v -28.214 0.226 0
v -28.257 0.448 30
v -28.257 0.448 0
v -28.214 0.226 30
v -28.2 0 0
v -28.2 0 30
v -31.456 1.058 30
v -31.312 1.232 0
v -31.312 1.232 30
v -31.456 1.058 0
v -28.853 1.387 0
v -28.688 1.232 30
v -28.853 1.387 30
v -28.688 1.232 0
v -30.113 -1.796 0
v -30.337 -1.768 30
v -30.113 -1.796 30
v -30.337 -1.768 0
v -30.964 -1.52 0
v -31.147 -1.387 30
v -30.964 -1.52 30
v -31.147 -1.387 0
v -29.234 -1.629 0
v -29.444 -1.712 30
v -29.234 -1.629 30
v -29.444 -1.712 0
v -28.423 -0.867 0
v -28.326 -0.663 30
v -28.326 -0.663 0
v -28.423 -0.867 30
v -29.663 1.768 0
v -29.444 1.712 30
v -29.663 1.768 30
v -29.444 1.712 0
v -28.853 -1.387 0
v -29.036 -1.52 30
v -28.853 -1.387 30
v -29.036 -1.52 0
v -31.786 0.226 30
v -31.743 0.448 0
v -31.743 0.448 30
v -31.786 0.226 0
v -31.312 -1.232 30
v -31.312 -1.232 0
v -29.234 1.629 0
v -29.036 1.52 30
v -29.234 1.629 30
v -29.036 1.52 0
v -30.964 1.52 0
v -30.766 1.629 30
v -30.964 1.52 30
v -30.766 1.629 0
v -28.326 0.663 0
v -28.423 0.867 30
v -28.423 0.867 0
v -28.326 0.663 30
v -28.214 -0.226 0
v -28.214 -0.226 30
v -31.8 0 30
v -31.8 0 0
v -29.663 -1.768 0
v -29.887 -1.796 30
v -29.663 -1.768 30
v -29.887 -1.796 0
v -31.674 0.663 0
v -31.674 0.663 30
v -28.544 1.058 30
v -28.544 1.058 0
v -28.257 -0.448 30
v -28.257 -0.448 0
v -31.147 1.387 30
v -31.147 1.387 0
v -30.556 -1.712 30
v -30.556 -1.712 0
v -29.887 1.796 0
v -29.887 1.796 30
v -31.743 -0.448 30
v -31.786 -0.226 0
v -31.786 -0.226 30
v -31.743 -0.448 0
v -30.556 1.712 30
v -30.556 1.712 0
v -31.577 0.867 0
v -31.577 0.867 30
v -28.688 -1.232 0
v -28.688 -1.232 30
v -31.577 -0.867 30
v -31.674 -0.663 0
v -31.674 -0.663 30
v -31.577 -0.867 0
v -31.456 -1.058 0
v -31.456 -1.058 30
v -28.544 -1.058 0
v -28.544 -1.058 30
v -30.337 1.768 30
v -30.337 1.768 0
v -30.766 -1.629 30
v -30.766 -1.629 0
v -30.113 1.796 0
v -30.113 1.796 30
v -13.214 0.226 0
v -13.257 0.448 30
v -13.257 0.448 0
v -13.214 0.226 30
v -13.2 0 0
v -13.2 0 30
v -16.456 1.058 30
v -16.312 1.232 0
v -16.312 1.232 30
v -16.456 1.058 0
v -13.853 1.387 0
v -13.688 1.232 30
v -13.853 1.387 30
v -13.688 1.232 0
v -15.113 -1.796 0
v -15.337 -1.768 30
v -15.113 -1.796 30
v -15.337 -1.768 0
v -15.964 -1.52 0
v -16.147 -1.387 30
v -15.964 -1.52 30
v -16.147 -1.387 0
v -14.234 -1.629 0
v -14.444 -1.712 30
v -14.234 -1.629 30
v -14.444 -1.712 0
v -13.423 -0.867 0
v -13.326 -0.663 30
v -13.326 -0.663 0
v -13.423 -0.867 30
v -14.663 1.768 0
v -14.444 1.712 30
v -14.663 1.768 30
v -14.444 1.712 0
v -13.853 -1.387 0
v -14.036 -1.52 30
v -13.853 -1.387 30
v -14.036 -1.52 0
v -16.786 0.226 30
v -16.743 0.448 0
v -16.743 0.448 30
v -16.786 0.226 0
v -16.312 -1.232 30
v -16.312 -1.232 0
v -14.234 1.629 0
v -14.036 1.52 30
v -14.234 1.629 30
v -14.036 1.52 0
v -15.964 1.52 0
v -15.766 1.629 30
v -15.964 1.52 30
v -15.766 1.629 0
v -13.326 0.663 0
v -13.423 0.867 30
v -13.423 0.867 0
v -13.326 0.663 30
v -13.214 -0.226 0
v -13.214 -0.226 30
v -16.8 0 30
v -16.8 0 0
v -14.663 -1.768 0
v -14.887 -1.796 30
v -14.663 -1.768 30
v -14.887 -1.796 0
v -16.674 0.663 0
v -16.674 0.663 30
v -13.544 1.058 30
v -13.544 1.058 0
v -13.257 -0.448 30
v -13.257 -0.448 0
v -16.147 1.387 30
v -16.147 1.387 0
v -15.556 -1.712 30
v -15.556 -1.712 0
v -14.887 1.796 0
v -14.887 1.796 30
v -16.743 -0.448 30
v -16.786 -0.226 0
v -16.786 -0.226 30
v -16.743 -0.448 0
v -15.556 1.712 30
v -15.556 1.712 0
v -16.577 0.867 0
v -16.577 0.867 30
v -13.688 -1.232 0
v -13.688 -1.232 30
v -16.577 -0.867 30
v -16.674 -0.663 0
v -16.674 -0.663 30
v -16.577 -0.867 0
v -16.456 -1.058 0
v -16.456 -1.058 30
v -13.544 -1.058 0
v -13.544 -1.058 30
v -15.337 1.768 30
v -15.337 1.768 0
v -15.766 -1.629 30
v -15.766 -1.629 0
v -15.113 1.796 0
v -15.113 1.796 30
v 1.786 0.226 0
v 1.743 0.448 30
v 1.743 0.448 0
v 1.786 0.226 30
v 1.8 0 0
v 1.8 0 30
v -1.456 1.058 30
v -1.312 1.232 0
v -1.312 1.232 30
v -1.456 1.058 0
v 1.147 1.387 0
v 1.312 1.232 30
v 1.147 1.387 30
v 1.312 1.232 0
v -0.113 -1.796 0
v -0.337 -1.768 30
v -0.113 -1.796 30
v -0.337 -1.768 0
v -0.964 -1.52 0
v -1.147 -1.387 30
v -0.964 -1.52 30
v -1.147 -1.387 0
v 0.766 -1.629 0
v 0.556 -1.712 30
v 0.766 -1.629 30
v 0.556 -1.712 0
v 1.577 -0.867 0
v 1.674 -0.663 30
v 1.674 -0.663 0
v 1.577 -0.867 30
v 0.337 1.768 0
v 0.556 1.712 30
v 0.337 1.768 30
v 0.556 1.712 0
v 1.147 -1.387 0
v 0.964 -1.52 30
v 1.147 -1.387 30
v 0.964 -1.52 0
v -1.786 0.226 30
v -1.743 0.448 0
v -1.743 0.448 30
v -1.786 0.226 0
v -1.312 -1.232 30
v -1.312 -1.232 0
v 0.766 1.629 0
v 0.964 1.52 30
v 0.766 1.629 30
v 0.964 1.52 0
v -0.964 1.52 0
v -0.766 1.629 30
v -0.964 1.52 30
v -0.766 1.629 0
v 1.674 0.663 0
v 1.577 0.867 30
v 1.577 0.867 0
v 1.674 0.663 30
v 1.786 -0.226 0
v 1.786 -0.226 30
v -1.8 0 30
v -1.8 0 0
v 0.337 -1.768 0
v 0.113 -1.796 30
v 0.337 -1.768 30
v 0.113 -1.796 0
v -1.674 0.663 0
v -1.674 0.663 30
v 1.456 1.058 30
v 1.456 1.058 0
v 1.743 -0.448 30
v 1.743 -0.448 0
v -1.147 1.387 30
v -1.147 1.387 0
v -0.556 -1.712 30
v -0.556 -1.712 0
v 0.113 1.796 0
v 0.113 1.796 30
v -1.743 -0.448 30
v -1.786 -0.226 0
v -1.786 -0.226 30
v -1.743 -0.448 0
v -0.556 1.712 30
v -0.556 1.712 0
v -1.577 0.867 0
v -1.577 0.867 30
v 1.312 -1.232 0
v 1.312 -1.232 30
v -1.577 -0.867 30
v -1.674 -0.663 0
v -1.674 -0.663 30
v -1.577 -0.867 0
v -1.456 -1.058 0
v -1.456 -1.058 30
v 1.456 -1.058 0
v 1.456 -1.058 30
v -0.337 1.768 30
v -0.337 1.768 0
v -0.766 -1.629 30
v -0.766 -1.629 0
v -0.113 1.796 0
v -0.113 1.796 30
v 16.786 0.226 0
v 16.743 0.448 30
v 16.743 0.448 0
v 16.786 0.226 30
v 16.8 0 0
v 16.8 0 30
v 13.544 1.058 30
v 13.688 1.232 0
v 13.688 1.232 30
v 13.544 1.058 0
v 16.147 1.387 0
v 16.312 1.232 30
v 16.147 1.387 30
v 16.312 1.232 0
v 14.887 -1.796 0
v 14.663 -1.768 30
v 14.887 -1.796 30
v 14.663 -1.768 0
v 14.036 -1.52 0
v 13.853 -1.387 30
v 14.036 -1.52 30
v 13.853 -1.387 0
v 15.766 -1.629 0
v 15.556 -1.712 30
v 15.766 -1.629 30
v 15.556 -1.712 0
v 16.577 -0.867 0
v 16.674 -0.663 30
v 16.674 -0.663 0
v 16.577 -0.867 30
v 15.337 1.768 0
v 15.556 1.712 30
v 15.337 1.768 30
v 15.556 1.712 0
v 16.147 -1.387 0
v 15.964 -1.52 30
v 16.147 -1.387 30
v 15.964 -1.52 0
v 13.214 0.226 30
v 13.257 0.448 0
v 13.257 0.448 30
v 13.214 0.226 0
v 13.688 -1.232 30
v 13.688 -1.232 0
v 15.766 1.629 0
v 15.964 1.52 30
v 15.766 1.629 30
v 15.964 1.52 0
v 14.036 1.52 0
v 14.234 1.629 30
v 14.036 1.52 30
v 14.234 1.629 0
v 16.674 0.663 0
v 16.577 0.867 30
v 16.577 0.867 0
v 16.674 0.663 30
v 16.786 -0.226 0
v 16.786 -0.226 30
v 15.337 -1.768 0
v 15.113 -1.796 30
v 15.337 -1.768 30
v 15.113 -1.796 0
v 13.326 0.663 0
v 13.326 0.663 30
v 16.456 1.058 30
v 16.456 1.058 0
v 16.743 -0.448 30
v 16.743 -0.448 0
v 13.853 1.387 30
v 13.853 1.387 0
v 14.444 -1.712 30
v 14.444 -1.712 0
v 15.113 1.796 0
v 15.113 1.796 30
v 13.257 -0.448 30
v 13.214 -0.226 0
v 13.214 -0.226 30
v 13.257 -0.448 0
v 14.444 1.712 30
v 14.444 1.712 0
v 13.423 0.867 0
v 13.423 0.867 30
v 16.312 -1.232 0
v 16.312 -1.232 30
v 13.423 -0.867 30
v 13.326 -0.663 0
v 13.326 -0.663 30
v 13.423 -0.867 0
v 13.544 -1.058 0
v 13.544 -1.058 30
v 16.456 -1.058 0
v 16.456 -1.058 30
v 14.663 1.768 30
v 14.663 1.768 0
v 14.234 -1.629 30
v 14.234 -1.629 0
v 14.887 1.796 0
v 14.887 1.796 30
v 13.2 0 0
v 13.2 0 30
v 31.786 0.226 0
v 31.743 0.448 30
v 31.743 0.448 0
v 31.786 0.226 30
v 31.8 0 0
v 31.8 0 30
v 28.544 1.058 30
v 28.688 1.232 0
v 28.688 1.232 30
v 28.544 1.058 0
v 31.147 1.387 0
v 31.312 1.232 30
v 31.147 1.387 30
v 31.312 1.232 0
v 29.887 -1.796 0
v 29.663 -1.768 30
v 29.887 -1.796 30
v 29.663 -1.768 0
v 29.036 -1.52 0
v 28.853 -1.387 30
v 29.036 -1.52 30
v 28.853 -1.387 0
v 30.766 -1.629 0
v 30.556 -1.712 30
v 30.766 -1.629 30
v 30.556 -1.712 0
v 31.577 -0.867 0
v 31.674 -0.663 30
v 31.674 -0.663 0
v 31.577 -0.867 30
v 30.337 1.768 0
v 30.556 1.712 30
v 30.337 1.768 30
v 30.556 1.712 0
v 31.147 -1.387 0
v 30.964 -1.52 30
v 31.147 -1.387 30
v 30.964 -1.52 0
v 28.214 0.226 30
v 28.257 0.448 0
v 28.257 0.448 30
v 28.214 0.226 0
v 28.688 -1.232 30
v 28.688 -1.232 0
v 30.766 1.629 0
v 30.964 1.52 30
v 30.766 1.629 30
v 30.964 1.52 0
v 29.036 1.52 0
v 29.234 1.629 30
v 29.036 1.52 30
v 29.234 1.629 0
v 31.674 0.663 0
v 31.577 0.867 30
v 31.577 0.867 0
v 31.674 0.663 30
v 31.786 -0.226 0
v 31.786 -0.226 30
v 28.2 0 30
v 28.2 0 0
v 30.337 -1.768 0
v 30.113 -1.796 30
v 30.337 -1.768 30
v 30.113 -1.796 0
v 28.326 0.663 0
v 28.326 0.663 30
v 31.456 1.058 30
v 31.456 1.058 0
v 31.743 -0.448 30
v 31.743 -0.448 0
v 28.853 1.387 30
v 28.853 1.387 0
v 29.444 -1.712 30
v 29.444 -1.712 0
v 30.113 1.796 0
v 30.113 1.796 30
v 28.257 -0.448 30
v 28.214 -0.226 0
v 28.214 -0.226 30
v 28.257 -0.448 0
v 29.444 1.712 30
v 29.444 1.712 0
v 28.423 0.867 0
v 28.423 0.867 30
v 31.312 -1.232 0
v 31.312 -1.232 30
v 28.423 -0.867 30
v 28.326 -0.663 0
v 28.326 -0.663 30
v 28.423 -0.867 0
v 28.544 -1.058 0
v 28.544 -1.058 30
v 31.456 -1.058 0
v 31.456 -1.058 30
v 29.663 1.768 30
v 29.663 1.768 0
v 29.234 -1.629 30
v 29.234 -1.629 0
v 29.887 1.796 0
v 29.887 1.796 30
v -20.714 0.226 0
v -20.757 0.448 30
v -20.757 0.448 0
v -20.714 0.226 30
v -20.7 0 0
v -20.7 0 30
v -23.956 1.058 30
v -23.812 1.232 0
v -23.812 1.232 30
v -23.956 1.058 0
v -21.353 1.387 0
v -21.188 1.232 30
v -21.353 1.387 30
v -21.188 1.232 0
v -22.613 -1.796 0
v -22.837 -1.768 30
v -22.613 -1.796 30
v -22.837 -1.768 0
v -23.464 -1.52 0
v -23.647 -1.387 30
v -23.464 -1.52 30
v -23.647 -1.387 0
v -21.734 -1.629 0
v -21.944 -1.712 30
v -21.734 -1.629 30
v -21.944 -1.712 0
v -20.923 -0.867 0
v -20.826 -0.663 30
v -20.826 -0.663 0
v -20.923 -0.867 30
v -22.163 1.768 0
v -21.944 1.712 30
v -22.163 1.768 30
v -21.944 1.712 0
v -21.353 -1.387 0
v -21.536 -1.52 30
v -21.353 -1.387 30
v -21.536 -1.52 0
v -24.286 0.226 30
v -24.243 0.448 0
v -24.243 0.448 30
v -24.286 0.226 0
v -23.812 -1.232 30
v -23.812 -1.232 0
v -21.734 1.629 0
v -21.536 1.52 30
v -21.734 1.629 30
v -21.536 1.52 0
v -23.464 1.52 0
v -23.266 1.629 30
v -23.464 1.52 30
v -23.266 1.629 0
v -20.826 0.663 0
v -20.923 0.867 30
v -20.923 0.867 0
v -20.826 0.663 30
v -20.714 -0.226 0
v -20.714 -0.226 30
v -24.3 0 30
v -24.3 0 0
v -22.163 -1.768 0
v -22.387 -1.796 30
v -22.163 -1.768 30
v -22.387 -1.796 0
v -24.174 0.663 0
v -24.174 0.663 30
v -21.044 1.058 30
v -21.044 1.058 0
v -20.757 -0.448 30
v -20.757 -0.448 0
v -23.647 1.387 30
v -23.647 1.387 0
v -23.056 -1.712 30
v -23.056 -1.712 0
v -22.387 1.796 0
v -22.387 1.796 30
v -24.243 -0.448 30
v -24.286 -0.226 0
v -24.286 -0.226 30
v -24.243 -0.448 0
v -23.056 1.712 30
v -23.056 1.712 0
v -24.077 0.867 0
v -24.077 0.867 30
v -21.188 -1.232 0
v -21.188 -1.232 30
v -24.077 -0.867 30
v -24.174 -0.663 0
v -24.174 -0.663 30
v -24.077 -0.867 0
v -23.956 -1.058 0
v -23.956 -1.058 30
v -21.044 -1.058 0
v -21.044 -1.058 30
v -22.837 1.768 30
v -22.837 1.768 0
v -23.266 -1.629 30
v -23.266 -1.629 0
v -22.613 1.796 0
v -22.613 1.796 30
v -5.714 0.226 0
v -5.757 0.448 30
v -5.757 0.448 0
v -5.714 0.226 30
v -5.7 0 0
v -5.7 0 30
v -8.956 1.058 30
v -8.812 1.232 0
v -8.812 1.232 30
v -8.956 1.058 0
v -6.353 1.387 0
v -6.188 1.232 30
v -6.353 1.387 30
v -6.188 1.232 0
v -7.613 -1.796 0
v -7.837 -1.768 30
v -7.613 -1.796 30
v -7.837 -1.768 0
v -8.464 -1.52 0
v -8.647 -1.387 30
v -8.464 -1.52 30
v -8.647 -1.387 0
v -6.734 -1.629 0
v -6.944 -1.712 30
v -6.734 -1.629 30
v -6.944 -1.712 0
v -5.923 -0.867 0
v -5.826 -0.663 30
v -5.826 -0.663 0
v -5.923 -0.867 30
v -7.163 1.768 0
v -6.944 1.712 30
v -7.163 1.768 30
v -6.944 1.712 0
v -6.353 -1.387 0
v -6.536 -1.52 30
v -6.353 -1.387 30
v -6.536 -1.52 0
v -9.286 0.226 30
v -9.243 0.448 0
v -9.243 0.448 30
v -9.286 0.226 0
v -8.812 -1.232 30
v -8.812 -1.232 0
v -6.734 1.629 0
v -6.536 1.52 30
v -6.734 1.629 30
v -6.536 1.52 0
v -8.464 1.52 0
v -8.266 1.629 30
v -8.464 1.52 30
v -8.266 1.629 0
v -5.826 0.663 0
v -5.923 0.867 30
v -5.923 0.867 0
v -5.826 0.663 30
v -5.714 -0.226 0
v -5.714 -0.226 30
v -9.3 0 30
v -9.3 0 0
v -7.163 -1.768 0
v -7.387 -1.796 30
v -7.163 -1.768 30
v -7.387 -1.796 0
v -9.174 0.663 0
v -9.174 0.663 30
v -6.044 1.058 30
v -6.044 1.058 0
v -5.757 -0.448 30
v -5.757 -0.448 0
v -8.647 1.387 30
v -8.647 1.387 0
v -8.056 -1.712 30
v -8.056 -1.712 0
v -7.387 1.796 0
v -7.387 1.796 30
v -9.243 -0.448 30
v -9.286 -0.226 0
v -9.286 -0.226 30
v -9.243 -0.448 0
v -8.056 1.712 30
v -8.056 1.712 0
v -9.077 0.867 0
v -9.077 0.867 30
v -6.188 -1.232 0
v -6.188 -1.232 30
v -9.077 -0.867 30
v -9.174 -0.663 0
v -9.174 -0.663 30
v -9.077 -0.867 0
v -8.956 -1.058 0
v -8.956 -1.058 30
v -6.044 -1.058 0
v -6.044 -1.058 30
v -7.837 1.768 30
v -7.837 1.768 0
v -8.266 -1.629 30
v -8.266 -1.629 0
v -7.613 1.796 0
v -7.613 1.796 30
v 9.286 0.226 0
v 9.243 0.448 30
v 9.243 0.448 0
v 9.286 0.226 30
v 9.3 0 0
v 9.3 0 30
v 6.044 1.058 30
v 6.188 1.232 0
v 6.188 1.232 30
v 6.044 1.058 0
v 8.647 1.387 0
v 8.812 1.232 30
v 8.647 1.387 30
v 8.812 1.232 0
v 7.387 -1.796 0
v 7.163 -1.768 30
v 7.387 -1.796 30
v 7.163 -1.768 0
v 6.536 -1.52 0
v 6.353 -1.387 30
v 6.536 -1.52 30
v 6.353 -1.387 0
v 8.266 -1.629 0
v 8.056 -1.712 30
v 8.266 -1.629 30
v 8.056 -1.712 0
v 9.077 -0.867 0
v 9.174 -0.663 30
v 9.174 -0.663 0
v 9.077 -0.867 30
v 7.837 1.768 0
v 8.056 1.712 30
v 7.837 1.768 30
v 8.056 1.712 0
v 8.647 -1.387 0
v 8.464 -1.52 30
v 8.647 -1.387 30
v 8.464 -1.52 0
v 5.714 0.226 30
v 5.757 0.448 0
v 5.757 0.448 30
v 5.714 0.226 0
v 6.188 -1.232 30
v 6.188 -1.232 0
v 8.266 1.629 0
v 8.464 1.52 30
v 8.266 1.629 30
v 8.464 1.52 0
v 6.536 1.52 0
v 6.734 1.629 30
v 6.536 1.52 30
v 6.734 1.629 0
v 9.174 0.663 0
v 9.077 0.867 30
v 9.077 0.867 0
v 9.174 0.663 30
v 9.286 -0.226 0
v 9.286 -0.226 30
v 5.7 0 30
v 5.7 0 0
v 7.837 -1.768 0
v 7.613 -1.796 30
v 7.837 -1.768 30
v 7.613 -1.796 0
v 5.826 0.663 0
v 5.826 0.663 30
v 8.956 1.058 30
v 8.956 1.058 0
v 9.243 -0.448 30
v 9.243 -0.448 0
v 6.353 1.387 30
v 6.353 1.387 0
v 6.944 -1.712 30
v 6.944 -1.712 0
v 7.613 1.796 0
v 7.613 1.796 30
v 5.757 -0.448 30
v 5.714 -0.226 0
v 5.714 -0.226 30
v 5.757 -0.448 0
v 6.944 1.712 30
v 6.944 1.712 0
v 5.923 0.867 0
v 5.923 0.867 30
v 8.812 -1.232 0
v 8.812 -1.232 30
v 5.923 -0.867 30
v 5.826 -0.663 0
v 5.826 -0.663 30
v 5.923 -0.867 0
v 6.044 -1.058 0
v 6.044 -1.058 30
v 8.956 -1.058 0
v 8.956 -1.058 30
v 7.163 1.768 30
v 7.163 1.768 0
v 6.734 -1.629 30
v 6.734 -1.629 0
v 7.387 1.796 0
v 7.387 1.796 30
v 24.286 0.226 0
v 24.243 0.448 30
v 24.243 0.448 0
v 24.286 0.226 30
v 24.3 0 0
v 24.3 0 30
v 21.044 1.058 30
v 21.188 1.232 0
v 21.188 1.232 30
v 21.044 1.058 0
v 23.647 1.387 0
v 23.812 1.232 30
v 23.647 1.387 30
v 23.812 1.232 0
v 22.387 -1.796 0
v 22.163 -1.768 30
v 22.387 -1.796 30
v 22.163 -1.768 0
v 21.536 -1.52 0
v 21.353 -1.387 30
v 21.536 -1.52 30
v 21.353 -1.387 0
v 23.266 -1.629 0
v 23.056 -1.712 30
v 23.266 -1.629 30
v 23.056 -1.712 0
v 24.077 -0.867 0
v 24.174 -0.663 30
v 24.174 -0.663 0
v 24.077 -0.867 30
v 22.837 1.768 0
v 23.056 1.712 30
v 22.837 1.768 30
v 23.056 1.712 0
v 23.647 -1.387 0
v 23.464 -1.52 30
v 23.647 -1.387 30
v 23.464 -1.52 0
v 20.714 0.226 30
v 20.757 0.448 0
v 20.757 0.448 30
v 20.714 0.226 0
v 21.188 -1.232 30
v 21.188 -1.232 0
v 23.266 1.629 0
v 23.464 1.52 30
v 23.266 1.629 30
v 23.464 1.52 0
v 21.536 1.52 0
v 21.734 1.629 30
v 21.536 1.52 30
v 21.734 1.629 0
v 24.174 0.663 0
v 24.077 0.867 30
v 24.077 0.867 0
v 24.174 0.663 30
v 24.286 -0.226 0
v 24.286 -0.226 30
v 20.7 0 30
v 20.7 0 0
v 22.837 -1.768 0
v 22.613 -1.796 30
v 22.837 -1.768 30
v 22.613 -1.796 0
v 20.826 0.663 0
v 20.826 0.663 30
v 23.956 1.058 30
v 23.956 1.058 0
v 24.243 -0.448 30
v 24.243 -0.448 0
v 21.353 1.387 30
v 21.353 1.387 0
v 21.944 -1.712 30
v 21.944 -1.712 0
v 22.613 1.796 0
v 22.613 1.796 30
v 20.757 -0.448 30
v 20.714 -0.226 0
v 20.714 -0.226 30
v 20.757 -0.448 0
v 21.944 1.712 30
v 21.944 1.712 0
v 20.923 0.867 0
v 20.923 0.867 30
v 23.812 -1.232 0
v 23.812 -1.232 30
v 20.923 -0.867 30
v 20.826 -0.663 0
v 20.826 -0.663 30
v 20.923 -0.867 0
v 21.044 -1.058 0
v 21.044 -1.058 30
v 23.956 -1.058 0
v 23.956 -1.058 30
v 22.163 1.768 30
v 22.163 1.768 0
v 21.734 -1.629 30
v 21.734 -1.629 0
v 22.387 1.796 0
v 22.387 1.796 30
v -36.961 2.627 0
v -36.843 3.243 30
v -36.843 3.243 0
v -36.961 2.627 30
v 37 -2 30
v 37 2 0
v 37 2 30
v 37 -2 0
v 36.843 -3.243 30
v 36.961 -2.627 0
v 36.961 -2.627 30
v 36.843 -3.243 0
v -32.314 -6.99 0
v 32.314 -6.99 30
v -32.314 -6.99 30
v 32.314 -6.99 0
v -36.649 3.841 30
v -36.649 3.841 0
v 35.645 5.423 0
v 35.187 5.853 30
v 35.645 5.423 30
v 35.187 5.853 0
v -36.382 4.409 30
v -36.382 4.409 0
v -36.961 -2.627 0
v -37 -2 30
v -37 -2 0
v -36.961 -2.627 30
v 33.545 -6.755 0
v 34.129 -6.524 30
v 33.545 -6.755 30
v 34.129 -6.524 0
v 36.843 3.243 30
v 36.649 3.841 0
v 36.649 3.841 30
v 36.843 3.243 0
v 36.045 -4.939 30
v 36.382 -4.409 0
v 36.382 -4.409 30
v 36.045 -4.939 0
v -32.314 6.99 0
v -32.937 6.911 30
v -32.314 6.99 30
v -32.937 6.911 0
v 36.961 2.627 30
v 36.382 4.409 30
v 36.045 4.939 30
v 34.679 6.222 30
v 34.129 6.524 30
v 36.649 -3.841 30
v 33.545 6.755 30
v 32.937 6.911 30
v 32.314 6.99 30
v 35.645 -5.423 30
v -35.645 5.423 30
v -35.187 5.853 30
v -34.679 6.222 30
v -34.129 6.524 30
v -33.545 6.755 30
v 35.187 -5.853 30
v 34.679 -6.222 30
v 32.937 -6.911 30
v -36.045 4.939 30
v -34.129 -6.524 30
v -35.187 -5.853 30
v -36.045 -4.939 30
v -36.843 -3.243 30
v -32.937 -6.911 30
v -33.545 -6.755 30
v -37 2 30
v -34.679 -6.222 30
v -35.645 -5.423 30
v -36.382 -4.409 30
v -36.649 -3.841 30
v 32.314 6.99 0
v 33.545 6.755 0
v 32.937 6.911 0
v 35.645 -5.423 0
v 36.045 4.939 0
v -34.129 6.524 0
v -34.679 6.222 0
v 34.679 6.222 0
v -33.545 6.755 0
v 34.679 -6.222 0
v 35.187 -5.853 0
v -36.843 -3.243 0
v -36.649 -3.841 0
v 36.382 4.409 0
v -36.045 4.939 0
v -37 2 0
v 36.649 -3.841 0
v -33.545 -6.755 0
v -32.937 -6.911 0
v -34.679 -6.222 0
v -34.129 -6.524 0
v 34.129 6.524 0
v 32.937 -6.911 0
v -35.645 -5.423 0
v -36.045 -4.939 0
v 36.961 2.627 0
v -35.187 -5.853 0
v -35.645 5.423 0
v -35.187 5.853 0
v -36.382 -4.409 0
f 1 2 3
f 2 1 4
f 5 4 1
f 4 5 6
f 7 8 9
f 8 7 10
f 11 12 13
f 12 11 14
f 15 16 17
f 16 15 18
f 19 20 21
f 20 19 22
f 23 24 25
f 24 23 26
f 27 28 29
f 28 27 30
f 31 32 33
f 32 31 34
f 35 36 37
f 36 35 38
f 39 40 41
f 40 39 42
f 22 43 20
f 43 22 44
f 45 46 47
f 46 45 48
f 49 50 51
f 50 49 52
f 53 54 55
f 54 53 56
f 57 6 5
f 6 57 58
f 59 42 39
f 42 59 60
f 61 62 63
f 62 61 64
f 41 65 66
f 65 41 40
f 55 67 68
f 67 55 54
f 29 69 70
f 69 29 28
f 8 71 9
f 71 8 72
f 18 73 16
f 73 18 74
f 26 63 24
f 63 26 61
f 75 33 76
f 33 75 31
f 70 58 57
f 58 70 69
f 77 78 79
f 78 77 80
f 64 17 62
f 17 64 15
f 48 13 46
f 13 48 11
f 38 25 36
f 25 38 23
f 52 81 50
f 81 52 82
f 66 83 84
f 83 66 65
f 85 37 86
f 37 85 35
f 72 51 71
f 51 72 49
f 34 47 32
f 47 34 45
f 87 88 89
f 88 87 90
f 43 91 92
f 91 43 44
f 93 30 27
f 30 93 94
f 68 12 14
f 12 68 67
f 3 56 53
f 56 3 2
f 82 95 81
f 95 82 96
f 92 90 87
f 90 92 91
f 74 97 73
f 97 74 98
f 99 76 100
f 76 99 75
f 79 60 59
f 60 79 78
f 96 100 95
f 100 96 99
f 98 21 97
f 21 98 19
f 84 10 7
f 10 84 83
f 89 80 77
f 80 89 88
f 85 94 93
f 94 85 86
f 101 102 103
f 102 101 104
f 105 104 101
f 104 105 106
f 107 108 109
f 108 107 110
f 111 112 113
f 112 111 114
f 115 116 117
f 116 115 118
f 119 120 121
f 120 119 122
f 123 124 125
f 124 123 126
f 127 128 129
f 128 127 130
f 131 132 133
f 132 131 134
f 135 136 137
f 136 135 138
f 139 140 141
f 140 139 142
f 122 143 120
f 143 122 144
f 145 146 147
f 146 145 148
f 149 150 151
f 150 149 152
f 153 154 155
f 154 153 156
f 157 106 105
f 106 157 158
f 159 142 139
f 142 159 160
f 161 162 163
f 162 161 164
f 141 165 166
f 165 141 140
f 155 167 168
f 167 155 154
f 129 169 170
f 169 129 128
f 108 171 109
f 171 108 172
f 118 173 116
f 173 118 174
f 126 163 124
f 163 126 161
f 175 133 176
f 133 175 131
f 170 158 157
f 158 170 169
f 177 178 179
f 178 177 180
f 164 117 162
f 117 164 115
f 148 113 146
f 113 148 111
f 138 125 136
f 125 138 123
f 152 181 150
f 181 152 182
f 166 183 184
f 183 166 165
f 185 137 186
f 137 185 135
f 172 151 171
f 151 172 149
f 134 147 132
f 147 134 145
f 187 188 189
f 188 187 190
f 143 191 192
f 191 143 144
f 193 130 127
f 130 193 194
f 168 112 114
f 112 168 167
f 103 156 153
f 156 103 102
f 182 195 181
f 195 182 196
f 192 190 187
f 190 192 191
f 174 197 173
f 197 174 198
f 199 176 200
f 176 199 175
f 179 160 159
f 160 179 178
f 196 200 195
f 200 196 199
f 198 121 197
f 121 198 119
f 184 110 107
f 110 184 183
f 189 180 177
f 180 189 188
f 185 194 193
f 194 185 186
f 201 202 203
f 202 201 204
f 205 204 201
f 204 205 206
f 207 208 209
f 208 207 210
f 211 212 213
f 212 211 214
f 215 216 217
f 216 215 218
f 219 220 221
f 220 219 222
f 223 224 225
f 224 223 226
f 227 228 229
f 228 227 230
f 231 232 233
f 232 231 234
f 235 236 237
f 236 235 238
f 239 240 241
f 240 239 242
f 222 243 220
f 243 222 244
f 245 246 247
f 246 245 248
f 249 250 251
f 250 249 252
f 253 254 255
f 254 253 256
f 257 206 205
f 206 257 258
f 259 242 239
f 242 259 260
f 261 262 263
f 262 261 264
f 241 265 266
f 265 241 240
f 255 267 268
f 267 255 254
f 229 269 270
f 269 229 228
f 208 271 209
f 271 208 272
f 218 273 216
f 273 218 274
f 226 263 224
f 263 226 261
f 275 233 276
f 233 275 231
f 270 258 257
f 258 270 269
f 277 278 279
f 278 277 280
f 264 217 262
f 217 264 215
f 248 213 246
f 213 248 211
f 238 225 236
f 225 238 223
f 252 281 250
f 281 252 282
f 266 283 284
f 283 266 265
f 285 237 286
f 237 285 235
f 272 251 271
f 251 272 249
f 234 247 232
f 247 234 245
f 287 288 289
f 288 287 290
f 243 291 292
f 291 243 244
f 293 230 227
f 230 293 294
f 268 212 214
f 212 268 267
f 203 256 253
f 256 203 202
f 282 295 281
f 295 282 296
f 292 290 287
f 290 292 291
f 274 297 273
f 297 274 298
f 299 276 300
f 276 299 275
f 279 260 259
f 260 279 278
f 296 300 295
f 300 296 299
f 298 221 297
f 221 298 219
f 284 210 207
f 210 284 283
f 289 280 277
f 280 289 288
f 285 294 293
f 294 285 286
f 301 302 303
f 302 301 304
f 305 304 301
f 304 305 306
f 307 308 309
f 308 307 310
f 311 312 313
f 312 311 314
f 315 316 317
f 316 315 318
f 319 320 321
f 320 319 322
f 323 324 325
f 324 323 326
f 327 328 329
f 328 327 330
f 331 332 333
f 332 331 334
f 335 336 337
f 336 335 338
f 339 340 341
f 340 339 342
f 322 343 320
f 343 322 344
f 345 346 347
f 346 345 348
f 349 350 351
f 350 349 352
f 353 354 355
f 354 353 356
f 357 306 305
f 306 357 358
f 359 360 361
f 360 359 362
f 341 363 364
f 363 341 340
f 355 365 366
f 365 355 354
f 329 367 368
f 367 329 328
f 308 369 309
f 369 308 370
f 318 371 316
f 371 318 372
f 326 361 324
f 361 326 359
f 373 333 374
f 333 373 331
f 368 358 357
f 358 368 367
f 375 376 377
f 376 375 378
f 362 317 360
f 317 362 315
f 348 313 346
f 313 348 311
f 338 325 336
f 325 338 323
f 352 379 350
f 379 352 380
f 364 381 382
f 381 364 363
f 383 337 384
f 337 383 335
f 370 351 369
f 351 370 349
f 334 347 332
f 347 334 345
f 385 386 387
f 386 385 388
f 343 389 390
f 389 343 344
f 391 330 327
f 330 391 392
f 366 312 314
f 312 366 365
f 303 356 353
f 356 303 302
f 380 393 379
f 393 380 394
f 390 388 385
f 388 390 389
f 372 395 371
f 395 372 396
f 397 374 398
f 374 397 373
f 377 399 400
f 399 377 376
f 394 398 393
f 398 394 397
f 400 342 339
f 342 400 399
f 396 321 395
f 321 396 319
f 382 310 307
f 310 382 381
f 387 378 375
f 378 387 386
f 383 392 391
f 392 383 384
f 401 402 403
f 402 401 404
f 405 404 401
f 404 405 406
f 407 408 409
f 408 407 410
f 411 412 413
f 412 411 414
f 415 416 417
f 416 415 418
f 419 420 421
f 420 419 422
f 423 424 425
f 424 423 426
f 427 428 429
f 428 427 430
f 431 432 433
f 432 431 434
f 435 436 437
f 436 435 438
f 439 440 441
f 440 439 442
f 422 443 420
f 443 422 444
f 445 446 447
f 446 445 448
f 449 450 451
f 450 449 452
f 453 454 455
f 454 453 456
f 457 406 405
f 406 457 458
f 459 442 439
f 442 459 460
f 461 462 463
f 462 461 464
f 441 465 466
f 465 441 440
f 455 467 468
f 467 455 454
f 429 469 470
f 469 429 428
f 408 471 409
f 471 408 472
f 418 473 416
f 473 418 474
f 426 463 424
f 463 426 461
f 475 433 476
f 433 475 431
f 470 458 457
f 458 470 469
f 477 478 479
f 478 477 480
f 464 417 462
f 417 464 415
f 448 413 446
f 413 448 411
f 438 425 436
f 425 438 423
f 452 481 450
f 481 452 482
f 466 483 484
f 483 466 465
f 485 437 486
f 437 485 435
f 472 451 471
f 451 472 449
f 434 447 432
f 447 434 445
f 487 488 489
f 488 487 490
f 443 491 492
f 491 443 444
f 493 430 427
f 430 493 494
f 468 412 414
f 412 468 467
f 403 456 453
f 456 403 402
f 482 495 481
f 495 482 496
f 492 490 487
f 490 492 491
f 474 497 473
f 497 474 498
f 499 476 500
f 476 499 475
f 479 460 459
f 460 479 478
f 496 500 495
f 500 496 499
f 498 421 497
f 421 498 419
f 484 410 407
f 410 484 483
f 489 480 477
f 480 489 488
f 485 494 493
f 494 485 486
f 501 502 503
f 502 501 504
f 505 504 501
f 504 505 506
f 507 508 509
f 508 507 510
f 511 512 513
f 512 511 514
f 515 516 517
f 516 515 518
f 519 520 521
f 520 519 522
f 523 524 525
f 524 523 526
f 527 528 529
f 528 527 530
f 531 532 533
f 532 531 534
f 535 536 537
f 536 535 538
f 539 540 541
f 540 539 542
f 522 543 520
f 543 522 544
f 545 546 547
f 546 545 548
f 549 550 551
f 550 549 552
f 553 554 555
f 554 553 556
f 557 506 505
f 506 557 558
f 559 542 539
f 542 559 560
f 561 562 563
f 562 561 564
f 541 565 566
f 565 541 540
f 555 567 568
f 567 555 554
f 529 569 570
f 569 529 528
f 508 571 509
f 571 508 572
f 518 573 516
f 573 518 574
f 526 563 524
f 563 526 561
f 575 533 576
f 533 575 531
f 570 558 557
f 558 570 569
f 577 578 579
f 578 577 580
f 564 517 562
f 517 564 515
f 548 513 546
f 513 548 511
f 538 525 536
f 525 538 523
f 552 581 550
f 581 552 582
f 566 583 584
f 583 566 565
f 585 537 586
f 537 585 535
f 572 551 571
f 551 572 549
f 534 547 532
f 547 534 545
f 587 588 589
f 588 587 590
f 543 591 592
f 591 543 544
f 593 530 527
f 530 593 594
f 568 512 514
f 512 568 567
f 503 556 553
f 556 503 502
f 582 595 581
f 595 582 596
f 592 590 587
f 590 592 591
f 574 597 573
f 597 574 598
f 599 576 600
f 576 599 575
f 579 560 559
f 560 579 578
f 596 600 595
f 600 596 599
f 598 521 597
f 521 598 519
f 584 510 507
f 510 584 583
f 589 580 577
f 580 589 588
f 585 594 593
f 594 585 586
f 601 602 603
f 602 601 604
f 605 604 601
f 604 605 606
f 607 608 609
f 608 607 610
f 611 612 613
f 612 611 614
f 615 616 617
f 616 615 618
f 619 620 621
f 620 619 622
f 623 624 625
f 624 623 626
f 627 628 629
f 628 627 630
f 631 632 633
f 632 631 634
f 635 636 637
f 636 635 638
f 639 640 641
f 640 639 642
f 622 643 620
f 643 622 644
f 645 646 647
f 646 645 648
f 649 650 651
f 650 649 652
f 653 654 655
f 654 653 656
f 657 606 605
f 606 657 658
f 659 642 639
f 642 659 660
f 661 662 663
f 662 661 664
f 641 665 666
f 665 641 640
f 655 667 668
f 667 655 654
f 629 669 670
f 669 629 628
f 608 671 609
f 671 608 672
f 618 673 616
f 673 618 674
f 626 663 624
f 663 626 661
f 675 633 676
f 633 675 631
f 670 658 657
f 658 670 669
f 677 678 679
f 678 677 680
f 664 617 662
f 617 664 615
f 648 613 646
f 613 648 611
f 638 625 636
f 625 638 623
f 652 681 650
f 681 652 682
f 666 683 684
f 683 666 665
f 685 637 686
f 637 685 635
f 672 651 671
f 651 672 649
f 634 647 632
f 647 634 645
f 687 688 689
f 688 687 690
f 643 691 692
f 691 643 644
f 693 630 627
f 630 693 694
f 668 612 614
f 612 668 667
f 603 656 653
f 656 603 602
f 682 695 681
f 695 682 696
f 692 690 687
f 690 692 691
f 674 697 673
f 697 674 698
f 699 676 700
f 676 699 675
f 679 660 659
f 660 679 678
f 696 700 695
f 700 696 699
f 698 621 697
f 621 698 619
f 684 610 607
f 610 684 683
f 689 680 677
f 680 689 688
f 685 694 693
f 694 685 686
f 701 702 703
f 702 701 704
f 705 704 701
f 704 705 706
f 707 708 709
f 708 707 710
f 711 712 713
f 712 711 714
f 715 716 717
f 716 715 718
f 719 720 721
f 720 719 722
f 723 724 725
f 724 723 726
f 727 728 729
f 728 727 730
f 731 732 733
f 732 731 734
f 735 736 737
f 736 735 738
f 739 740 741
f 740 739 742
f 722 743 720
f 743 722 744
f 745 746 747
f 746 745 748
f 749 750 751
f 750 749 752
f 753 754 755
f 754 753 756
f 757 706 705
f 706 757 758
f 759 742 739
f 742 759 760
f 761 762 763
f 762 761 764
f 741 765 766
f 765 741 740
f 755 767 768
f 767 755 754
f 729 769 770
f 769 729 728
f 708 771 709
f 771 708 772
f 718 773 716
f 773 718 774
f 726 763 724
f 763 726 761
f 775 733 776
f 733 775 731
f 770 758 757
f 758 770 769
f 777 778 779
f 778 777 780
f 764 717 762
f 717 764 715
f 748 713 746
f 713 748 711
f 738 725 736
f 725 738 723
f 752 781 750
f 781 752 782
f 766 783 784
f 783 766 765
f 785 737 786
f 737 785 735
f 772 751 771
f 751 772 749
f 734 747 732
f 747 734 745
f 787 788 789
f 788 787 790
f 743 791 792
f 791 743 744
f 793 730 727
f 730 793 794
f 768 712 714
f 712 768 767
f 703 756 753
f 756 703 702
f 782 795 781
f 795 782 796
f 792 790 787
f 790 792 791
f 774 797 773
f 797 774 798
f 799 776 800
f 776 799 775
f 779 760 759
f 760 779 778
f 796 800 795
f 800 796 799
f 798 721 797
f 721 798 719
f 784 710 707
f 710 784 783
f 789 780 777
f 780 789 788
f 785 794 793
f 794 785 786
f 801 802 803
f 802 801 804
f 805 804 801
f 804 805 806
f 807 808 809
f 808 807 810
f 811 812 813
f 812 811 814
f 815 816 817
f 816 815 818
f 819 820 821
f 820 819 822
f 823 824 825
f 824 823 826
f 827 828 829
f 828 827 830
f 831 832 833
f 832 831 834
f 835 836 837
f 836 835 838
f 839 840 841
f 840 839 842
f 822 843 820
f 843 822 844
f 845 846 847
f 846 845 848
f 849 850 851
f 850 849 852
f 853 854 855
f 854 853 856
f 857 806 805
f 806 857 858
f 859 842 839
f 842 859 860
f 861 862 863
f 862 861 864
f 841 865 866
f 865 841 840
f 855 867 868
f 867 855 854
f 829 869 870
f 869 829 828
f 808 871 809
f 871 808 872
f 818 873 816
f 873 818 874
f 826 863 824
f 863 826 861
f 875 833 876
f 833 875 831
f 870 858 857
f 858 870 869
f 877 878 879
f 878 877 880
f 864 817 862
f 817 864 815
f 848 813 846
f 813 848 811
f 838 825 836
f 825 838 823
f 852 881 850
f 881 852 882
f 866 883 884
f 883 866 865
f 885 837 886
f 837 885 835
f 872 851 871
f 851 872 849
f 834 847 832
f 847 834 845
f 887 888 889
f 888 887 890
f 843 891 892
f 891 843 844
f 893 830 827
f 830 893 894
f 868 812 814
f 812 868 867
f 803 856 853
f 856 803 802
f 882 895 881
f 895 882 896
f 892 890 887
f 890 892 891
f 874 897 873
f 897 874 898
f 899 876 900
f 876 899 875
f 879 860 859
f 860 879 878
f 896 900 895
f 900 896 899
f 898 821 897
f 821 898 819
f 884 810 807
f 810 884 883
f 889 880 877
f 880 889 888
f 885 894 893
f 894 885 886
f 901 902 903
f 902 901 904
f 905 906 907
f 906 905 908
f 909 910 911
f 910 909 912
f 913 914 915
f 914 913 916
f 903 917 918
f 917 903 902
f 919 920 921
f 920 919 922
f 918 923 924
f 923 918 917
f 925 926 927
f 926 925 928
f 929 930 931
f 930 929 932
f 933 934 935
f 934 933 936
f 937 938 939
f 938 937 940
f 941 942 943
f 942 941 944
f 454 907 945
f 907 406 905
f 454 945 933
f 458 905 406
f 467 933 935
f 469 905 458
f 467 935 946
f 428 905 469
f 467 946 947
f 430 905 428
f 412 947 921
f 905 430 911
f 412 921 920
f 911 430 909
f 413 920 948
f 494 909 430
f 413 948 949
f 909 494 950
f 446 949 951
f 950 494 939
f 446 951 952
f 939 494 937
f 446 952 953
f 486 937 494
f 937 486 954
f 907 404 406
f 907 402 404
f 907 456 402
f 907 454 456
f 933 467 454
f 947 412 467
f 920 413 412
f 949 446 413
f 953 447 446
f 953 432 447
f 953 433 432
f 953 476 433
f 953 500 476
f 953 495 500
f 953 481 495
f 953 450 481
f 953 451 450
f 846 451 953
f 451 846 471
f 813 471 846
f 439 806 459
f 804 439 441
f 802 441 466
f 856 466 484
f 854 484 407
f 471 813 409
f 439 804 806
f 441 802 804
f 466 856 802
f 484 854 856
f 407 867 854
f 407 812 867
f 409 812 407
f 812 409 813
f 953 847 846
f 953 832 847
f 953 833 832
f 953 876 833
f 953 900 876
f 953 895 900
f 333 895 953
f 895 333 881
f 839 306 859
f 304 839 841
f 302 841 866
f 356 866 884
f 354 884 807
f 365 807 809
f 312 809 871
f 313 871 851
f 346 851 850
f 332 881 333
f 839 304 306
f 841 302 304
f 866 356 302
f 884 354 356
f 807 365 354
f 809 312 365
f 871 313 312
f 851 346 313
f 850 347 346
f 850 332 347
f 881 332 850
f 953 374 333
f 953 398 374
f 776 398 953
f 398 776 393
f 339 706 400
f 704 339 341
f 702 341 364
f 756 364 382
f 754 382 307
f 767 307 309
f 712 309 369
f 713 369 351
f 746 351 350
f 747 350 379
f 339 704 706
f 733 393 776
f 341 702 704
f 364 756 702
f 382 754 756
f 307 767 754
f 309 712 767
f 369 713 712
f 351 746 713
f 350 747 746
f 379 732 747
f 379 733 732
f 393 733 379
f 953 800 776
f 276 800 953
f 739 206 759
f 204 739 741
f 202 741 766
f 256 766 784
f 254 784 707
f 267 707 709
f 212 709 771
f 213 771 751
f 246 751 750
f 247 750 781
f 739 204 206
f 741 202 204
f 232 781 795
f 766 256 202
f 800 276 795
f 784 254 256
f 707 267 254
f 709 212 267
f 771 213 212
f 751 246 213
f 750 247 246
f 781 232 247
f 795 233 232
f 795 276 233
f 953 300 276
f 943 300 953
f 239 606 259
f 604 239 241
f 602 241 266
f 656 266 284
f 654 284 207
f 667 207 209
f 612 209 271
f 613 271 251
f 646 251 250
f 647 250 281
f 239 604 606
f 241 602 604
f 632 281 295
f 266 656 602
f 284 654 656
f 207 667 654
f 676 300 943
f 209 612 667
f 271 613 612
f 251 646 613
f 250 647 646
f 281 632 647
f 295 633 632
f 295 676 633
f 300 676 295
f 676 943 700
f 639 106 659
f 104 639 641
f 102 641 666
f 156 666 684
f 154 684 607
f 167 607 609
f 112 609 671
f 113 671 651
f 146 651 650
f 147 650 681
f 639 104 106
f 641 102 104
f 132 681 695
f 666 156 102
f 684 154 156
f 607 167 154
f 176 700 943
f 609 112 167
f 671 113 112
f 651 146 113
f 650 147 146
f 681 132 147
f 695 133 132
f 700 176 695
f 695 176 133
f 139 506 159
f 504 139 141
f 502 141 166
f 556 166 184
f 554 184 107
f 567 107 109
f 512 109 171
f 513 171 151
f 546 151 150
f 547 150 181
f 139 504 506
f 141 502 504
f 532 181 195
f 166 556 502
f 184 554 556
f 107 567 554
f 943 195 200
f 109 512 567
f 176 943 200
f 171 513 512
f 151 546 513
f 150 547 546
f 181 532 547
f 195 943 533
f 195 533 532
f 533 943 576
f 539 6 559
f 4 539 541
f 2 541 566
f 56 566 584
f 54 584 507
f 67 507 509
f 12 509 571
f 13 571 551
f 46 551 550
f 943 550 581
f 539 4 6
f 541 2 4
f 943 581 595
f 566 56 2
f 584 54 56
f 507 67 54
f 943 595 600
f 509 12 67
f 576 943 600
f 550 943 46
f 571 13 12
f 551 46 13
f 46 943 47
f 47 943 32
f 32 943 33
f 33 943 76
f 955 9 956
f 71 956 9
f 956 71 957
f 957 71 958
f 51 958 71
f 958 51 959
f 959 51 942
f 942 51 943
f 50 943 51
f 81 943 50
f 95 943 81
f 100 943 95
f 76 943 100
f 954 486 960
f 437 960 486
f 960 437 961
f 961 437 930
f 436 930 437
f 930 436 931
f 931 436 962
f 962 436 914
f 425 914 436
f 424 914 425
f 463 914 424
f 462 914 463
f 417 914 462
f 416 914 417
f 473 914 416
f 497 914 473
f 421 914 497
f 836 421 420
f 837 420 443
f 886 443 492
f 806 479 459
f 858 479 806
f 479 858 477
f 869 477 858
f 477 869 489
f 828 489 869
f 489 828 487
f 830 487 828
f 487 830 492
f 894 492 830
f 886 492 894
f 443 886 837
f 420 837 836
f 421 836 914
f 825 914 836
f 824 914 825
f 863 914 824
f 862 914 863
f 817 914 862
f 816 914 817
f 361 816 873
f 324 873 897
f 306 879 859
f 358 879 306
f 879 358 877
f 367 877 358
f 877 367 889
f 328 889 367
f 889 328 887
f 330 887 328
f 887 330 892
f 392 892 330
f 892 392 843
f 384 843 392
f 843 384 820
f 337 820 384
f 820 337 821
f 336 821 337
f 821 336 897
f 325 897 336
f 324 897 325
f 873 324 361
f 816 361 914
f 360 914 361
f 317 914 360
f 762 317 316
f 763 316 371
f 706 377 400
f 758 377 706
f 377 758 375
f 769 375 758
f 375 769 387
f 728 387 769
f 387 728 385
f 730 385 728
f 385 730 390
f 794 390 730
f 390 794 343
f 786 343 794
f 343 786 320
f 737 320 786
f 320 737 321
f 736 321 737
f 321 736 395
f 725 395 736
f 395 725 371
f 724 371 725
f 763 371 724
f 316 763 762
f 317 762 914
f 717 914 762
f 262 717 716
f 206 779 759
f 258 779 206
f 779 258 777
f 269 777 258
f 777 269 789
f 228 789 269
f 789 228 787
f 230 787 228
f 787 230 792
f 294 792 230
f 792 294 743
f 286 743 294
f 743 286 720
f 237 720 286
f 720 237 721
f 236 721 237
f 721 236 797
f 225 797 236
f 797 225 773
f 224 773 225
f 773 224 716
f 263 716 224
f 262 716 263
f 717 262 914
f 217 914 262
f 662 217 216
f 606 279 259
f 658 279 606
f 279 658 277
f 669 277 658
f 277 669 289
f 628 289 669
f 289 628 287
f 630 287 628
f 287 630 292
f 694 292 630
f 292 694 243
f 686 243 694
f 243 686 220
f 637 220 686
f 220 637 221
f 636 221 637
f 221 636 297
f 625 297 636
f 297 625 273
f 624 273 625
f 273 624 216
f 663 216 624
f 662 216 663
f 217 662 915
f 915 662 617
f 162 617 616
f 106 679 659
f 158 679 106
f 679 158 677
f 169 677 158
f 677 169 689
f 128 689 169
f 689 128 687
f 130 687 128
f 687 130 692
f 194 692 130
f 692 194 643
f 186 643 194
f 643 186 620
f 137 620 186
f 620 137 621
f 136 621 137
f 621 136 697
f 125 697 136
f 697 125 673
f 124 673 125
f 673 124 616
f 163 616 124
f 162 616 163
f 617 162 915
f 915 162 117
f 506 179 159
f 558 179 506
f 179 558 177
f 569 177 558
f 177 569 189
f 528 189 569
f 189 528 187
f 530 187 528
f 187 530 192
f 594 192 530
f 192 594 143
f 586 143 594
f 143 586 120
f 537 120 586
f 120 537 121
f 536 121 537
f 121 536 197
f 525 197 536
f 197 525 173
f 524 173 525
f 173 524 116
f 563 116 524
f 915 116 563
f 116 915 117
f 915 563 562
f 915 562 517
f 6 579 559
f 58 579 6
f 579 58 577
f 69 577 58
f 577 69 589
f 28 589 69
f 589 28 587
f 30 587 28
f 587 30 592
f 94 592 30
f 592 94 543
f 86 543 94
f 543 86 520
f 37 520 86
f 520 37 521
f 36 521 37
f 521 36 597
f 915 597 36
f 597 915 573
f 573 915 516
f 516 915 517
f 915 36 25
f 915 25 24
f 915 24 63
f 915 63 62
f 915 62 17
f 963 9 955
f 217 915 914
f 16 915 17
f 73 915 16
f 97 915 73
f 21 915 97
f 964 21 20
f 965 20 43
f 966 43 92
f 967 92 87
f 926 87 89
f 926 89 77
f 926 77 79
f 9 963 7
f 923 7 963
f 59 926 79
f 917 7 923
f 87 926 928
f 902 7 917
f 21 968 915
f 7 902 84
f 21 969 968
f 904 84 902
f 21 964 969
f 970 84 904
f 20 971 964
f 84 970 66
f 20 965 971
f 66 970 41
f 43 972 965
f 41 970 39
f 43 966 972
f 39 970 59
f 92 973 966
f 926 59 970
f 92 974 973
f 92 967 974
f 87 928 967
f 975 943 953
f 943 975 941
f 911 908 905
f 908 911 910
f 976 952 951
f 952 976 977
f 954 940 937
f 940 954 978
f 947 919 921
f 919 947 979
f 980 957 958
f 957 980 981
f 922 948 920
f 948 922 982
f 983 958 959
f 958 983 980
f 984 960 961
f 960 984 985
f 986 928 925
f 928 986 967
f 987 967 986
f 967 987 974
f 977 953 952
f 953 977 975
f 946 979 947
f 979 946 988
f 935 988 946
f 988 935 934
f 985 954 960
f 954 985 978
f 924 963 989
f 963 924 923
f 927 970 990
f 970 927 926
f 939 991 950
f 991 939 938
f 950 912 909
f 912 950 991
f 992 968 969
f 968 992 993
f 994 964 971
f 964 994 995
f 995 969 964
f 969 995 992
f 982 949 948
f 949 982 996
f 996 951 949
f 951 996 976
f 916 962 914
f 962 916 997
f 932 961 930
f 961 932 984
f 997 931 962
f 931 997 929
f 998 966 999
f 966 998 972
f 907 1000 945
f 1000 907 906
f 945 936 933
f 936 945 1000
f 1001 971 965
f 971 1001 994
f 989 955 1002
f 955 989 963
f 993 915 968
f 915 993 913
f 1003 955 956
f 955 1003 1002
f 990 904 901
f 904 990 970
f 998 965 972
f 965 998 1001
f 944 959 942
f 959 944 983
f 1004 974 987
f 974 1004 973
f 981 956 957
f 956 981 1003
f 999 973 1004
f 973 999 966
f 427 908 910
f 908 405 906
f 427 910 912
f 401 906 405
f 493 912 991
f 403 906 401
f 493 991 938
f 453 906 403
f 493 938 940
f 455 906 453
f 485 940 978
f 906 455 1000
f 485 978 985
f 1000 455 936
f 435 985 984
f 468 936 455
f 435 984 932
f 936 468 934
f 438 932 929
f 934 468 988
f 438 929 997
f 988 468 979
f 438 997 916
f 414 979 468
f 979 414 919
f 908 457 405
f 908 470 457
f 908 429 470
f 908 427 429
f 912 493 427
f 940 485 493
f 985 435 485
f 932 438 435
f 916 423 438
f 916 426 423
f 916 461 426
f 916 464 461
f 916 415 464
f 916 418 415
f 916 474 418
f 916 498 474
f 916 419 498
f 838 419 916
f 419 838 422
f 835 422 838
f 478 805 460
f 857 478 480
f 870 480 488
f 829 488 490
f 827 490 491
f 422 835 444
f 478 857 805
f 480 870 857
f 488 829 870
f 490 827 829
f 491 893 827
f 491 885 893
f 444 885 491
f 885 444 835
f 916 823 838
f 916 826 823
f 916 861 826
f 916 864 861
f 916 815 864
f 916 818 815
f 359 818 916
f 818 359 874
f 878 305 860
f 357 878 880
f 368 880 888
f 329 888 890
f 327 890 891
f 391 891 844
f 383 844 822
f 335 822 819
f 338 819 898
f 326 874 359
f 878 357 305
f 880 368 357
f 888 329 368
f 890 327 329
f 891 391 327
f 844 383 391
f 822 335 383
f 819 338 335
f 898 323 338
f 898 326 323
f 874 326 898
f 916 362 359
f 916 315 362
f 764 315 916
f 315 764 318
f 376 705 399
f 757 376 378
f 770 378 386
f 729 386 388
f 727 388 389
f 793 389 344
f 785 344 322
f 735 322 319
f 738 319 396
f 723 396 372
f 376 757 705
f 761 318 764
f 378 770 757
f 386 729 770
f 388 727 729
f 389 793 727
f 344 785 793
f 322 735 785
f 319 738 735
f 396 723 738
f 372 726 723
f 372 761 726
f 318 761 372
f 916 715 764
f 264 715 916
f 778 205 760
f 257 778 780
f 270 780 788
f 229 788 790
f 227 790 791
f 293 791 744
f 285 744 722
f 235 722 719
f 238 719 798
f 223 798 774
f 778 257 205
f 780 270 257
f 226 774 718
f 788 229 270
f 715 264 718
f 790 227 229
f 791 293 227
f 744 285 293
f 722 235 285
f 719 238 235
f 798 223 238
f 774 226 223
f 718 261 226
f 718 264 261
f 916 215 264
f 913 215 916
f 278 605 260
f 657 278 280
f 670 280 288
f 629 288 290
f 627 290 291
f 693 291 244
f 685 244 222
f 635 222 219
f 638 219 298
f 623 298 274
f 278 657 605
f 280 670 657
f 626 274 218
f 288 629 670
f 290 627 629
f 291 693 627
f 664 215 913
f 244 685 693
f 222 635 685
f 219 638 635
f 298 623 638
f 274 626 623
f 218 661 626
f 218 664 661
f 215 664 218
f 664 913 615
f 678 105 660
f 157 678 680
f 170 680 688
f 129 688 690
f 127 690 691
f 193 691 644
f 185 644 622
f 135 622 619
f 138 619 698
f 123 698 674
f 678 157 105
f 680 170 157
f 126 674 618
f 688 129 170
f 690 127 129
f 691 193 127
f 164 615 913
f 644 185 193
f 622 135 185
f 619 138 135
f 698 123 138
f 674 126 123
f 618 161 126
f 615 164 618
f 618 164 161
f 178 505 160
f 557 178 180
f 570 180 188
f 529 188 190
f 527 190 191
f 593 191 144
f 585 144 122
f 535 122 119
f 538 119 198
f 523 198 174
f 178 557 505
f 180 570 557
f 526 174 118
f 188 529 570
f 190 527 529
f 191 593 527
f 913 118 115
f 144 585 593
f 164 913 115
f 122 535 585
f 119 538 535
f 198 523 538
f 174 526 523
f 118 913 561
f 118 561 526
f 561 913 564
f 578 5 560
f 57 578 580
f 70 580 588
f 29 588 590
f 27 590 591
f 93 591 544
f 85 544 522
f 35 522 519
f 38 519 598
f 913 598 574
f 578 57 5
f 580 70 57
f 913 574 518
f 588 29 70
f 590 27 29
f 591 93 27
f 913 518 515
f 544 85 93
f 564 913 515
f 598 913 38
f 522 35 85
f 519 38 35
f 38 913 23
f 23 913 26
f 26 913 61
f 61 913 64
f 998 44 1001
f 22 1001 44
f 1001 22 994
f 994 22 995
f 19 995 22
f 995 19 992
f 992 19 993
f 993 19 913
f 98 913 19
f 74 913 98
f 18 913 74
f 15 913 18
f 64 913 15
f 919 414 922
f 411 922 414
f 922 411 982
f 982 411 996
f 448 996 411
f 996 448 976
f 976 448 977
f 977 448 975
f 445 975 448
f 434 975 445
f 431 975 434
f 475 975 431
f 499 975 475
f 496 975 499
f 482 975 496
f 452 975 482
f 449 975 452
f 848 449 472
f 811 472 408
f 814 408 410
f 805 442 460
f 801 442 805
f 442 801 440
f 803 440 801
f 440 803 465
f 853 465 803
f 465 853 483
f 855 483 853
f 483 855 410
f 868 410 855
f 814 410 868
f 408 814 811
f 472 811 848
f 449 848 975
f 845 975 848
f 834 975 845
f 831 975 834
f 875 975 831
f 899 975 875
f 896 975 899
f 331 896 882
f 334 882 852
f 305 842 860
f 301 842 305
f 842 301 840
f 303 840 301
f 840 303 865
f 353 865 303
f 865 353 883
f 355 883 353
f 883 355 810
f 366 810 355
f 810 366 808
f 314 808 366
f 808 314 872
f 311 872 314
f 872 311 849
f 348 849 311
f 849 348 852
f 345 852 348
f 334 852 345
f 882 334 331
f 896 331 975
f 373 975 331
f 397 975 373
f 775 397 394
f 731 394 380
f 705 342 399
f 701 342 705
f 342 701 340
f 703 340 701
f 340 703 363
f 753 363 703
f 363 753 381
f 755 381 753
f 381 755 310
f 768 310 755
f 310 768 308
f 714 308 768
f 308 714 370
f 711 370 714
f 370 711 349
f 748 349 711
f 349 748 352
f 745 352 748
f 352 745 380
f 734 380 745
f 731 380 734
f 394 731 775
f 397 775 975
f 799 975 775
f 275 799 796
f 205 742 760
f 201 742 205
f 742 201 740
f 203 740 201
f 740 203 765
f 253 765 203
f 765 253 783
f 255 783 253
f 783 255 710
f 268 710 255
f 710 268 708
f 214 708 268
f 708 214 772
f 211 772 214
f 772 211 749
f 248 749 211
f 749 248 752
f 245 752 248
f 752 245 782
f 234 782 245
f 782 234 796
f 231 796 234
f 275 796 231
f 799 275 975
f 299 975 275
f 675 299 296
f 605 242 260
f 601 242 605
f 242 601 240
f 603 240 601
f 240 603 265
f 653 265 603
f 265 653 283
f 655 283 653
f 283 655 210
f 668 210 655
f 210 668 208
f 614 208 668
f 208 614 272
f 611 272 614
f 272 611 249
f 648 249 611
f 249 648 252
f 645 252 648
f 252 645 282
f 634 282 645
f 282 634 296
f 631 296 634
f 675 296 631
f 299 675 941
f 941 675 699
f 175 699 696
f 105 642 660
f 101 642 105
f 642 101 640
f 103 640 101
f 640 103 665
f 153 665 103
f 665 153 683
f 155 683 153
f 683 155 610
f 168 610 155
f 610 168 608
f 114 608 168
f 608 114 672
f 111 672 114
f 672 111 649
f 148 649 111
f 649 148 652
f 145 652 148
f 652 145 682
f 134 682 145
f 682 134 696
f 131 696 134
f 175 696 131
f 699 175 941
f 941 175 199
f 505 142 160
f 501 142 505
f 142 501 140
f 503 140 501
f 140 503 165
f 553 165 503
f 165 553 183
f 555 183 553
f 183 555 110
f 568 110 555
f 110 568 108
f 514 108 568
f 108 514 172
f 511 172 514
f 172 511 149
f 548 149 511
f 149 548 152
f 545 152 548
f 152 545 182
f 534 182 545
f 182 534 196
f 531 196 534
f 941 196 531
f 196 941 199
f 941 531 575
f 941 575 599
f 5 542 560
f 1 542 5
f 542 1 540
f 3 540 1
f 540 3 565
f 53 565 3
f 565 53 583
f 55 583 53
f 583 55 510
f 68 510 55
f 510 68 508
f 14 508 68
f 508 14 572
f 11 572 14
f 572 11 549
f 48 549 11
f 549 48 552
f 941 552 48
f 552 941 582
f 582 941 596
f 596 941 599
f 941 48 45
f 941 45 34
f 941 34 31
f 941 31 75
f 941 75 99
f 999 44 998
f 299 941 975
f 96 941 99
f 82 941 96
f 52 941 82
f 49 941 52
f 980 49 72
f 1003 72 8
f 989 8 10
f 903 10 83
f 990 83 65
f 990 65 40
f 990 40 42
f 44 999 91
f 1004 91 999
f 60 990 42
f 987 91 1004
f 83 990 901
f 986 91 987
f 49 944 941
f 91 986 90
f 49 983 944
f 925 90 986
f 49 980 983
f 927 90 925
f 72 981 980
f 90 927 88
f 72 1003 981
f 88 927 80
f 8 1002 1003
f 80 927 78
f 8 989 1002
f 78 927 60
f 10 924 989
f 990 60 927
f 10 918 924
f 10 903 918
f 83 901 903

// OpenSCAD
$fn = 50;


difference() {
	union() {
		hull() {
			translate(v = [-32.0000000000, 2.0000000000, 0]) {
				cylinder(h = 30, r = 5);
			}
			translate(v = [32.0000000000, 2.0000000000, 0]) {
				cylinder(h = 30, r = 5);
			}
			translate(v = [-32.0000000000, -2.0000000000, 0]) {
				cylinder(h = 30, r = 5);
			}
			translate(v = [32.0000000000, -2.0000000000, 0]) {
				cylinder(h = 30, r = 5);
			}
		}
	}
	union() {
		translate(v = [-30.0000000000, 0.0000000000, 0]) {
			translate(v = [0, 0, -100]) {
				cylinder(h = 200, r = 1.8000000000);
			}
		}
		translate(v = [-15.0000000000, 0.0000000000, 0]) {
			translate(v = [0, 0, -100]) {
				cylinder(h = 200, r = 1.8000000000);
			}
		}
		translate(v = [0, 0, -100]) {
			cylinder(h = 200, r = 1.8000000000);
		}
		translate(v = [15.0000000000, 0.0000000000, 0]) {
			translate(v = [0, 0, -100]) {
				cylinder(h = 200, r = 1.8000000000);
			}
		}
		translate(v = [30.0000000000, 0.0000000000, 0]) {
			translate(v = [0, 0, -100]) {
				cylinder(h = 200, r = 1.8000000000);
			}
		}
		translate(v = [-30.0000000000, 0.0000000000, 0]) {
			translate(v = [0, 0, -100]) {
				cylinder(h = 200, r = 1.8000000000);
			}
		}
		translate(v = [-22.5000000000, 0.0000000000, 0]) {
			translate(v = [0, 0, -100]) {
				cylinder(h = 200, r = 1.8000000000);
			}
		}
		translate(v = [-15.0000000000, 0.0000000000, 0]) {
			translate(v = [0, 0, -100]) {
				cylinder(h = 200, r = 1.8000000000);
			}
		}
		translate(v = [-7.5000000000, 0.0000000000, 0]) {
			translate(v = [0, 0, -100]) {
				cylinder(h = 200, r = 1.8000000000);
			}
		}
		translate(v = [0, 0, -100]) {
			cylinder(h = 200, r = 1.8000000000);
		}
		translate(v = [7.5000000000, 0.0000000000, 0]) {
			translate(v = [0, 0, -100]) {
				cylinder(h = 200, r = 1.8000000000);
			}
		}
		translate(v = [15.0000000000, 0.0000000000, 0]) {
			translate(v = [0, 0, -100]) {
				cylinder(h = 200, r = 1.8000000000);
			}
		}
		translate(v = [22.5000000000, 0.0000000000, 0]) {
			translate(v = [0, 0, -100]) {
				cylinder(h = 200, r = 1.8000000000);
			}
		}
		translate(v = [30.0000000000, 0.0000000000, 0]) {
			translate(v = [0, 0, -100]) {
				cylinder(h = 200, r = 1.8000000000);
			}
		}
	}
}
